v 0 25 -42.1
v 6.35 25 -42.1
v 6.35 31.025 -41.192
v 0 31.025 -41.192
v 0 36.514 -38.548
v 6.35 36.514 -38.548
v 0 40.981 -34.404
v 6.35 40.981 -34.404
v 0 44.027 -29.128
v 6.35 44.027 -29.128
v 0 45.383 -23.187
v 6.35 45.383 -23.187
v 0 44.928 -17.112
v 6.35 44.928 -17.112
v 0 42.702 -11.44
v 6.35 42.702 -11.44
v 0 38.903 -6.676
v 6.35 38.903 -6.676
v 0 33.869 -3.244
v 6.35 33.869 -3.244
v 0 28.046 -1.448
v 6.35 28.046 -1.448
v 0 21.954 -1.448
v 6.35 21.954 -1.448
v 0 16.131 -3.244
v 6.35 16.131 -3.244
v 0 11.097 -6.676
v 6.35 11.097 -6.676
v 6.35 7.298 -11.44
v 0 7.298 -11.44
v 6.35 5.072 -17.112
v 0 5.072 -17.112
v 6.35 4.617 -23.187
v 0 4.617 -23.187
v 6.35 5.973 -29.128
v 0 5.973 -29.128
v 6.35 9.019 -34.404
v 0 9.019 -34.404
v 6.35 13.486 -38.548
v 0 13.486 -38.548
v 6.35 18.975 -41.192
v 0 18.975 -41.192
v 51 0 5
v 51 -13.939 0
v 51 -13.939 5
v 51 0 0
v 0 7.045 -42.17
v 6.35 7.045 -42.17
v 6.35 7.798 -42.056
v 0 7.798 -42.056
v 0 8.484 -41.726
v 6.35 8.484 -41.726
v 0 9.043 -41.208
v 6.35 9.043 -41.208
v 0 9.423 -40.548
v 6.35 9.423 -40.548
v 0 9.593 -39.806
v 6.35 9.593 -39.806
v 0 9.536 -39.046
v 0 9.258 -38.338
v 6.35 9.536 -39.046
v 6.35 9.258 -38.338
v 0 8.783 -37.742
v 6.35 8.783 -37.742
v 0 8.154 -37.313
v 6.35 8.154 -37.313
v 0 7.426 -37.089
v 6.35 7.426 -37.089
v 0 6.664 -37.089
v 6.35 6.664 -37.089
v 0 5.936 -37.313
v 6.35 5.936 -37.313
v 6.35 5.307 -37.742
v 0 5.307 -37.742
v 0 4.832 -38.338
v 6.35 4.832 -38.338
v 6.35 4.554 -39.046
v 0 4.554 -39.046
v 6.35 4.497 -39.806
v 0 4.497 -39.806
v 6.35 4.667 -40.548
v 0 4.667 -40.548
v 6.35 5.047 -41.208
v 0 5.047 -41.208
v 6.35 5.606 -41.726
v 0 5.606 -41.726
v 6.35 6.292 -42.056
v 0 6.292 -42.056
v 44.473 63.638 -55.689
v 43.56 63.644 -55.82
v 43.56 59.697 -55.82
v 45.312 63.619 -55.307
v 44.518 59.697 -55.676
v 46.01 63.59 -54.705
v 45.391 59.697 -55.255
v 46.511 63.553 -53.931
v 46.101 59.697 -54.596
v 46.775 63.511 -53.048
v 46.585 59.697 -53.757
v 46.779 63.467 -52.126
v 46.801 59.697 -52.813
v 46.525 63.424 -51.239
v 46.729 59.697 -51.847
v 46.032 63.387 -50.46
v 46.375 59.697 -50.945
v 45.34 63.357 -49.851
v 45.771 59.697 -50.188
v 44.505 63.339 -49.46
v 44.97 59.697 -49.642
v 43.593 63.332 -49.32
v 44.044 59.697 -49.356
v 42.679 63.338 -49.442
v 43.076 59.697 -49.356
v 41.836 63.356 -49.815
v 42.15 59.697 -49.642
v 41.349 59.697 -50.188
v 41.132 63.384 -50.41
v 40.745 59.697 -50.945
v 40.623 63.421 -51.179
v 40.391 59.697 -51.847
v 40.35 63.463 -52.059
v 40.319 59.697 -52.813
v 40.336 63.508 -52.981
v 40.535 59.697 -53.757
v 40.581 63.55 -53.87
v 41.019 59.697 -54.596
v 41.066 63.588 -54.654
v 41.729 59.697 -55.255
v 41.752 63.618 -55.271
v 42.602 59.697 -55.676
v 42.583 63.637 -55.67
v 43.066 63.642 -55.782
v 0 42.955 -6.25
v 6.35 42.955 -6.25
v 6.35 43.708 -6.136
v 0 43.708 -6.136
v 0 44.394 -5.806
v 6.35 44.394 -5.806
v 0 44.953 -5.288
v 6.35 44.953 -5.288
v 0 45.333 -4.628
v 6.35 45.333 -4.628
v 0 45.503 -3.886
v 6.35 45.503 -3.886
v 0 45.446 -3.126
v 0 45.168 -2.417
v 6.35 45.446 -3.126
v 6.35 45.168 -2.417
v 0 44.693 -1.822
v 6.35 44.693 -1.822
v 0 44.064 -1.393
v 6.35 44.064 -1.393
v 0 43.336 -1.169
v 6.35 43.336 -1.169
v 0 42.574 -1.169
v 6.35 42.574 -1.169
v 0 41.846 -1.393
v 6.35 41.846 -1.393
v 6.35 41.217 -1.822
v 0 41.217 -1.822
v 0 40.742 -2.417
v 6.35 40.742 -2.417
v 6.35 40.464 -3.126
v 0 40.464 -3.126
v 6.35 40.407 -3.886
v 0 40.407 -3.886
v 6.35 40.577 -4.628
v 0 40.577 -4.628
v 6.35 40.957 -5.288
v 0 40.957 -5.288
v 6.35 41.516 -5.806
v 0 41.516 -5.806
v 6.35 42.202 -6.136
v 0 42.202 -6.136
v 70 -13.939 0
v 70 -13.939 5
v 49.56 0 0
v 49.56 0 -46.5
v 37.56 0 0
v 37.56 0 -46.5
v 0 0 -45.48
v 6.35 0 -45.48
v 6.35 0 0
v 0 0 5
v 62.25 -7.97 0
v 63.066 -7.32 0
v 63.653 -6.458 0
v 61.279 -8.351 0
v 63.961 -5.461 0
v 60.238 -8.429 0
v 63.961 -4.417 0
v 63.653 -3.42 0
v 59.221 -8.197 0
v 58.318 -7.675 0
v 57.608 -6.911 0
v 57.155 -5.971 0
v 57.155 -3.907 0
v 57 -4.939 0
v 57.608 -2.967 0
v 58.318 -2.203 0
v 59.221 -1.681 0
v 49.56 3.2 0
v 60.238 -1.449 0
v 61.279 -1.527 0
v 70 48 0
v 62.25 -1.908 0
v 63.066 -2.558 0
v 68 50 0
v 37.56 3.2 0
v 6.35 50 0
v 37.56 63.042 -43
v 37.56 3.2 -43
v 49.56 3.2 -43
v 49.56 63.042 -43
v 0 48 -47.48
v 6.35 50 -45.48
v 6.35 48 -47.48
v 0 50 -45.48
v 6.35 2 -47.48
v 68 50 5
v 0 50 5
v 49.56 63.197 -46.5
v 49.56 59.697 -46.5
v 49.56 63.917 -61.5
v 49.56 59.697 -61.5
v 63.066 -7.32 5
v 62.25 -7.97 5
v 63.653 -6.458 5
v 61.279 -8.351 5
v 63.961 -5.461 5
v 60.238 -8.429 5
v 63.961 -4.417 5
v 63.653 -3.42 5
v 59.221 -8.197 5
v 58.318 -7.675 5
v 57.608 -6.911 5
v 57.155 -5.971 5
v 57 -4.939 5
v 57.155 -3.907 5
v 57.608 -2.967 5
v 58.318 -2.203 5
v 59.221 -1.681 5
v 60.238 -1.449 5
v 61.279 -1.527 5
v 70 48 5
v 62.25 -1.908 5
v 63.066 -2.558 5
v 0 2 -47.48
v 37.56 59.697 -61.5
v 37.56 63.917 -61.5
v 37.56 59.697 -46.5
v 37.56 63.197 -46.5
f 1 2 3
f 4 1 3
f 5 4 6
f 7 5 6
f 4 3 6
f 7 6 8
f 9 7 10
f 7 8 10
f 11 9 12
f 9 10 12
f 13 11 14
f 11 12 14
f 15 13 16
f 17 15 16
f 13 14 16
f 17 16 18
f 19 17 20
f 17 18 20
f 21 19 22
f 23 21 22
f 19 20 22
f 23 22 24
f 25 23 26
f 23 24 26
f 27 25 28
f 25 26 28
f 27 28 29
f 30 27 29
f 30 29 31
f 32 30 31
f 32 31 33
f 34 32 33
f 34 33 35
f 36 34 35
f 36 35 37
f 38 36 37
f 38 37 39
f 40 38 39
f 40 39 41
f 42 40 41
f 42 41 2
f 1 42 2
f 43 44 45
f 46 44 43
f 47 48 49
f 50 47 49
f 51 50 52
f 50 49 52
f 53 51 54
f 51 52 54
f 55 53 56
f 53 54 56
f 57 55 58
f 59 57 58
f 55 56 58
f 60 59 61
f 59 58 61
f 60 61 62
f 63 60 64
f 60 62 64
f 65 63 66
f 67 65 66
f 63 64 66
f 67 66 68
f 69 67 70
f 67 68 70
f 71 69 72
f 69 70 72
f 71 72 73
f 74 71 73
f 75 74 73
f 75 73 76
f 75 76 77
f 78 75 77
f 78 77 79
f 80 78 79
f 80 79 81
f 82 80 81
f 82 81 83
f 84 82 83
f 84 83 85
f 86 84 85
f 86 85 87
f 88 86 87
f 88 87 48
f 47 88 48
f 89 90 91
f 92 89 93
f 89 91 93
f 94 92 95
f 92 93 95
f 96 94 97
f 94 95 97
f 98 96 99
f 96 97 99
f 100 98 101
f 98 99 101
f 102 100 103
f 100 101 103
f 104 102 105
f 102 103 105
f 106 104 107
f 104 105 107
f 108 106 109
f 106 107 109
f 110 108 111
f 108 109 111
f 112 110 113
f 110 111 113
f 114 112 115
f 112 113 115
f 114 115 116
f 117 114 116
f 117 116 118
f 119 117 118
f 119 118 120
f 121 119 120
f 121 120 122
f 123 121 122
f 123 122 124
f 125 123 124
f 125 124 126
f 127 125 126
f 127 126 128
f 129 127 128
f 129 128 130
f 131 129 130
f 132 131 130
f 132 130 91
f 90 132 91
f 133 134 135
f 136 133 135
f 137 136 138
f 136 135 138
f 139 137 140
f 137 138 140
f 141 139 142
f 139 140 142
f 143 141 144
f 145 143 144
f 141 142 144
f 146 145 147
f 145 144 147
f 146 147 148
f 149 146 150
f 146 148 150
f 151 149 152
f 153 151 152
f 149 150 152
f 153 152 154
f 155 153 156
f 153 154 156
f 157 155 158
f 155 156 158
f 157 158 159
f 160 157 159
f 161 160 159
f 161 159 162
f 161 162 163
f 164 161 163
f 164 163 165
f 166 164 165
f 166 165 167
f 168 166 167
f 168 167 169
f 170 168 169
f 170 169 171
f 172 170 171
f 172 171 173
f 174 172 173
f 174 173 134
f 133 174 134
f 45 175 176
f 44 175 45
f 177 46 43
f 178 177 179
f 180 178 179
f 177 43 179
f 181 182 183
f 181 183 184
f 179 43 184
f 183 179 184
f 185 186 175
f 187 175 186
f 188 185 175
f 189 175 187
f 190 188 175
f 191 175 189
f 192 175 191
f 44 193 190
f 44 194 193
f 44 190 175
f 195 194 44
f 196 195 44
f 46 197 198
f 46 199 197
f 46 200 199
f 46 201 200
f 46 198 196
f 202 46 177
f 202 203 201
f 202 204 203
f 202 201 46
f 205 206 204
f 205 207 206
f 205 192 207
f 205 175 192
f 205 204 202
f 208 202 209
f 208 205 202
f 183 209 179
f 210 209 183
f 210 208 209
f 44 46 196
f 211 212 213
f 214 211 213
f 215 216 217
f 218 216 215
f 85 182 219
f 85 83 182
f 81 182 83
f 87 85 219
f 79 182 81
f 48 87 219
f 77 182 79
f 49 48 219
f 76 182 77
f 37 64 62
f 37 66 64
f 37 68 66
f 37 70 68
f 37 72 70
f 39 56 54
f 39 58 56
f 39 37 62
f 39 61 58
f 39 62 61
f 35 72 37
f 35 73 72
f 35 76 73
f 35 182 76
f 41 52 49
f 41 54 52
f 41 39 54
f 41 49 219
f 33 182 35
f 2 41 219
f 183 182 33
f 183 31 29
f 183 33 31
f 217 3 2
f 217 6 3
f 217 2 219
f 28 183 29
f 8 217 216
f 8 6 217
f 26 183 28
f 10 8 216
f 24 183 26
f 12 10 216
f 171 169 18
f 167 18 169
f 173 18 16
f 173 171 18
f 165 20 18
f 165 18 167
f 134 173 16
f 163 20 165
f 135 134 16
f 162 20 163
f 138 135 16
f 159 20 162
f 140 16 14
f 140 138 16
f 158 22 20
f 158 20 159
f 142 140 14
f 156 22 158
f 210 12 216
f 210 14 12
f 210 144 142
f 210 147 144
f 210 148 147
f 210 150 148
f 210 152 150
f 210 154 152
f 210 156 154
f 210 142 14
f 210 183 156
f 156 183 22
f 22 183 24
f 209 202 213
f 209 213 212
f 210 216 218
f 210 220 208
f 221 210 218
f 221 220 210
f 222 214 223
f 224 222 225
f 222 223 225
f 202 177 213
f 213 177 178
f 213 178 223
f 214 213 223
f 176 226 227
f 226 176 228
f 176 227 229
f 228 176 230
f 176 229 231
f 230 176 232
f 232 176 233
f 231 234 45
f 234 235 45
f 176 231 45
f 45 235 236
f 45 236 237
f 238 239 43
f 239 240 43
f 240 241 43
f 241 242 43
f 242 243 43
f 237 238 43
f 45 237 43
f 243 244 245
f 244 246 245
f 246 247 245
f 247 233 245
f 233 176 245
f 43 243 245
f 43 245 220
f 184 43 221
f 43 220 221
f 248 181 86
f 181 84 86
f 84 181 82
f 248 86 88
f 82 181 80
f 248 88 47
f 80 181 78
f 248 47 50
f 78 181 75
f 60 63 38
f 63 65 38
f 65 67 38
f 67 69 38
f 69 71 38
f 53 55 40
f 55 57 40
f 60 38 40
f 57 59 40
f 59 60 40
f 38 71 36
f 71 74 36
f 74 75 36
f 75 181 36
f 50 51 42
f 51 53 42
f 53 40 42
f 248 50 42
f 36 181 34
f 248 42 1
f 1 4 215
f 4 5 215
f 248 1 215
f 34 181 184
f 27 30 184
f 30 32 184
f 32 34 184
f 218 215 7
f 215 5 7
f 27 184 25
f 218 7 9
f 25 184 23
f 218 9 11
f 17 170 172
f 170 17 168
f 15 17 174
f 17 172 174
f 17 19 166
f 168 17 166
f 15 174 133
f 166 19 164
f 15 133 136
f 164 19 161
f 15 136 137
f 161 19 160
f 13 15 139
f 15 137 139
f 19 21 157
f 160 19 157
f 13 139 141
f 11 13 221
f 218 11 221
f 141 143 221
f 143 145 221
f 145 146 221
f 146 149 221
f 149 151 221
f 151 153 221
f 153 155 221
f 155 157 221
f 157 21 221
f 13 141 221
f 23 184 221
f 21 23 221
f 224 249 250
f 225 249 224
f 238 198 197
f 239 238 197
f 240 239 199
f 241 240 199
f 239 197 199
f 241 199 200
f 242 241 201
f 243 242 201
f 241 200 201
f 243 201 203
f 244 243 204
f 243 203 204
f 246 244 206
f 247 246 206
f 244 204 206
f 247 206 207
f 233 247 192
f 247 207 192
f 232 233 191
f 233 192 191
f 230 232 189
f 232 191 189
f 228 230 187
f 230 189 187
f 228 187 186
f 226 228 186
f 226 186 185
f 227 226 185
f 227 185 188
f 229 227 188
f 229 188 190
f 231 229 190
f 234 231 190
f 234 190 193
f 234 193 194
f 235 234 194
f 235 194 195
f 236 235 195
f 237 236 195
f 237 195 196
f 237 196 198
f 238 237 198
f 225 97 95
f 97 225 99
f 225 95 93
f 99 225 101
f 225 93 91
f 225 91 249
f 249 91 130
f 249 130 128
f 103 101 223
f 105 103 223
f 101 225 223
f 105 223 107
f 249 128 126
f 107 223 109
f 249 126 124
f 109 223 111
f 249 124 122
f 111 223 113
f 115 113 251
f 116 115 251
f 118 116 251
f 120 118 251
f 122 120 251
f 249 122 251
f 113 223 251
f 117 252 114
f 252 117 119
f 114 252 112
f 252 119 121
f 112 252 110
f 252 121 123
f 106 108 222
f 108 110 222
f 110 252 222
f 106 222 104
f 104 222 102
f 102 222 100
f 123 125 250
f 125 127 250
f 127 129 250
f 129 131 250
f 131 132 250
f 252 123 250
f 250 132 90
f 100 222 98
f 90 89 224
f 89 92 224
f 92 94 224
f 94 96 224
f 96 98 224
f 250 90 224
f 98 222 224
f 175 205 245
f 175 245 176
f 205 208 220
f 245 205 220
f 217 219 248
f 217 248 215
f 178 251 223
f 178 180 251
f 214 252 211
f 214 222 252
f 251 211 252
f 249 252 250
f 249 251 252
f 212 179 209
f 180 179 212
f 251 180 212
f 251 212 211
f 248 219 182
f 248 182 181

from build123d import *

# Parameters (mm, degrees)
BOSS_EXTRUDE1_DEPTH  = 5
SKETCH2_W            = 6.35
SKETCH2_H            = 50
BOSS_EXTRUDE2_DEPTH  = 52.48
CUT_EXTRUDE1_REACH   = 106.448
SKETCH3_R            = 20.44
SKETCH3_R_2          = 2.555
SKETCH3_W            = 5
SKETCH3_H            = 50
CUT_EXTRUDE2_REACH   = 108.104
SKETCH4_R            = 3.5
CUT_EXTRUDE6_REACH   = 108.104
SKETCH14_W           = 23.196263878
SKETCH14_H           = 15.316152196
SKETCH15_W           = 12
SKETCH15_H           = 3.2
BOSS_EXTRUDE7_DEPTH  = 46.5
BOSS_EXTRUDE8_REACH  = 98.667
SKETCH16_W           = 12
SKETCH16_H           = 3.5
SKETCH17_W           = 12
SKETCH17_H           = 3.5
BOSS_EXTRUDE9_DEPTH  = 15
CHAMFER2_SIZE        = 2
SKETCH22_W           = 12
SKETCH22_H           = 15
BOSS_EXTRUDE10_DEPTH = 0.72
CUT_EXTRUDE8_REACH   = 103.606
CUT_EXTRUDE7_REACH   = 120.762
SKETCH18_R           = 3.25


with BuildPart() as part:
    # Sketch1 → Boss-Extrude1 (new body)
    with BuildSketch(Plane.XY):
        Polygon((0, 0), (0, 50), (51, 50), (51, 64.061014889), (70, 64.061014889), (70, -13.938985111), (51, -13.938985111), (51, 0), align=None)
    extrude(amount=BOSS_EXTRUDE1_DEPTH)

    # Sketch2 → Boss-Extrude2 (add)
    with BuildSketch(Plane(origin=(0, 0, 0), x_dir=(-1, 0, 0), z_dir=(0, 0, -1))):
        with Locations((-3.175, 25)):
            Rectangle(SKETCH2_W, SKETCH2_H)
    extrude(amount=BOSS_EXTRUDE2_DEPTH)

    # Sketch3 → Cut-Extrude1 (cut, up to next)
    with BuildSketch(Plane(origin=(6.35, 0, 0), x_dir=(0, 0, -1), z_dir=(1, 0, 0)), mode=Mode.PRIVATE) as cut_extrude1_sk1:
        with Locations((21.66, 25)):
            Circle(SKETCH3_R)
    cut_extrude1_tool1 = extrude(cut_extrude1_sk1.sketch, amount=-CUT_EXTRUDE1_REACH, mode=Mode.PRIVATE) & part.part
    # Sketch3 → Cut-Extrude1 (cut, up to next)
    with BuildSketch(Plane(origin=(6.35, 0, 0), x_dir=(0, 0, -1), z_dir=(1, 0, 0)), mode=Mode.PRIVATE) as cut_extrude1_sk2:
        with Locations((3.695, 42.955)):
            Circle(SKETCH3_R_2)
    cut_extrude1_tool2 = extrude(cut_extrude1_sk2.sketch, amount=-CUT_EXTRUDE1_REACH, mode=Mode.PRIVATE) & part.part
    # Sketch3 → Cut-Extrude1 (cut, up to next)
    with BuildSketch(Plane(origin=(6.35, 0, 0), x_dir=(0, 0, -1), z_dir=(1, 0, 0)), mode=Mode.PRIVATE) as cut_extrude1_sk3:
        with Locations((39.615, 7.045)):
            Circle(SKETCH3_R_2)
    cut_extrude1_tool3 = extrude(cut_extrude1_sk3.sketch, amount=-CUT_EXTRUDE1_REACH, mode=Mode.PRIVATE) & part.part
    # Sketch3 → Cut-Extrude1 (cut, up to next)
    with BuildSketch(Plane(origin=(6.35, 0, 0), x_dir=(0, 0, -1), z_dir=(1, 0, 0)), mode=Mode.PRIVATE) as cut_extrude1_sk4:
        with Locations((49.98, 25)):
            Rectangle(SKETCH3_W, SKETCH3_H)
    cut_extrude1_tool4 = extrude(cut_extrude1_sk4.sketch, amount=-CUT_EXTRUDE1_REACH, mode=Mode.PRIVATE) & part.part
    add(cut_extrude1_tool1.solids().sort_by_distance((6.35, 25, -21.66))[0], mode=Mode.SUBTRACT)
    add(cut_extrude1_tool2.solids().sort_by_distance((6.35, 42.955, -3.695))[0], mode=Mode.SUBTRACT)
    add(cut_extrude1_tool3.solids().sort_by_distance((6.35, 7.045, -39.615))[0], mode=Mode.SUBTRACT)
    add(cut_extrude1_tool4.solids().sort_by_distance((6.35, 25, -49.98))[0], mode=Mode.SUBTRACT)

    # Sketch4 → Cut-Extrude2 (cut, up to next)
    with BuildSketch(Plane(origin=(0, 0, 0), x_dir=(-1, 0, 0), z_dir=(0, 0, -1)), mode=Mode.PRIVATE) as cut_extrude2_sk1:
        with Locations((-60.5, 55.061014889)):
            Circle(SKETCH4_R)
    cut_extrude2_tool1 = extrude(cut_extrude2_sk1.sketch, amount=-CUT_EXTRUDE2_REACH, mode=Mode.PRIVATE) & part.part
    # Sketch4 → Cut-Extrude2 (cut, up to next)
    with BuildSketch(Plane(origin=(0, 0, 0), x_dir=(-1, 0, 0), z_dir=(0, 0, -1)), mode=Mode.PRIVATE) as cut_extrude2_sk2:
        with Locations((-60.5, -4.938985111)):
            Circle(SKETCH4_R)
    cut_extrude2_tool2 = extrude(cut_extrude2_sk2.sketch, amount=-CUT_EXTRUDE2_REACH, mode=Mode.PRIVATE) & part.part
    add(cut_extrude2_tool1.solids().sort_by_distance((60.5, 55.061015, 0))[0], mode=Mode.SUBTRACT)
    add(cut_extrude2_tool2.solids().sort_by_distance((60.5, -4.938985, 0))[0], mode=Mode.SUBTRACT)

    # Sketch14 → Cut-Extrude6 (cut, up to next)
    with BuildSketch(Plane(origin=(0, 0, 0), x_dir=(-1, 0, 0), z_dir=(0, 0, -1)), mode=Mode.PRIVATE) as cut_extrude6_sk1:
        with Locations((-62.598131939, 57.658076098)):
            Rectangle(SKETCH14_W, SKETCH14_H)
    cut_extrude6_tool1 = extrude(cut_extrude6_sk1.sketch, amount=-CUT_EXTRUDE6_REACH, mode=Mode.PRIVATE) & part.part
    add(cut_extrude6_tool1.solids().sort_by_distance((62.598132, 57.658076, 0))[0], mode=Mode.SUBTRACT)

    # Sketch15 → Boss-Extrude7 (add)
    with BuildSketch(Plane(origin=(0, 0, 0), x_dir=(-1, 0, 0), z_dir=(0, 0, -1))):
        with Locations((-43.56, 1.6)):
            Rectangle(SKETCH15_W, SKETCH15_H)
    extrude(amount=BOSS_EXTRUDE7_DEPTH)

    # Boss-Extrude8: up to this plane
    boss_extrude8_end = Plane(origin=(166.832994776, 64.085435133, -66.619565524), z_dir=(-1.1416993347548052e-15, 0.9990256874715413, 0.04413247978546202))
    # Sketch16 → Boss-Extrude8 (add, up to the surface)
    with BuildSketch(Plane(origin=(0, 3.2, 0), x_dir=(1, 0, 0), z_dir=(0, 1, 0)), mode=Mode.PRIVATE) as boss_extrude8_sk1:
        with Locations((43.56, 44.75)):
            Rectangle(SKETCH16_W, SKETCH16_H)
    boss_extrude8_tool1 = split(extrude(boss_extrude8_sk1.sketch, amount=BOSS_EXTRUDE8_REACH, mode=Mode.PRIVATE), bisect_by=boss_extrude8_end, keep=Keep.BOTH, mode=Mode.PRIVATE)
    add(boss_extrude8_tool1.solids().sort_by_distance((43.56, 3.2, -44.75))[0])

    # Sketch17 → Boss-Extrude9 (add)
    with BuildSketch(Plane(origin=(0, 0, -46.5), x_dir=(-1, 0, 0), z_dir=(0, 0, -1))):
        with Locations((-43.56, 61.446642853)):
            Rectangle(SKETCH17_W, SKETCH17_H)
    extrude(amount=BOSS_EXTRUDE9_DEPTH)

    # Chamfer2
    chamfer2_edges = [part.edges().sort_by_distance(p)[0] for p in [
        (3.175, 0, -47.48),
        (3.175, 50, -47.48),
        (70, 50, 2.5),
    ]]
    chamfer(chamfer2_edges, length=CHAMFER2_SIZE)

    # Sketch22 → Boss-Extrude10 (add)
    with BuildSketch(Plane(origin=(0, 63.196642853, 0), x_dir=(1, 0, 0), z_dir=(0, 1, 0))):
        with Locations((43.56, 54)):
            Rectangle(SKETCH22_W, SKETCH22_H)
    extrude(amount=BOSS_EXTRUDE10_DEPTH)

    # Sketch23 → Cut-Extrude8 (cut, up to next)
    with BuildSketch(Plane(origin=(49.56, 0, 0), x_dir=(0, 0, -1), z_dir=(1, 0, 0)), mode=Mode.PRIVATE) as cut_extrude8_sk1:
        Polygon((46.5, 63.916642853), (46.5, 63.196642853), (61.5, 63.916642853), align=None)
    cut_extrude8_tool1 = extrude(cut_extrude8_sk1.sketch, amount=-CUT_EXTRUDE8_REACH, mode=Mode.PRIVATE) & part.part
    add(cut_extrude8_tool1.solids().sort_by_distance((49.56, 63.676643, -51.5))[0], mode=Mode.SUBTRACT)

    # Cut-Extrude7: up to this plane
    cut_extrude7_end = Plane(origin=(-0.001, 63.196642853, -46.5), z_dir=(-2.1659106514416256e-15, -0.9988499868416298, -0.04794479936839813))
    # Sketch18 → Cut-Extrude7 (cut, up to the surface)
    with BuildSketch(Plane.XZ.offset(-59.696642853), mode=Mode.PRIVATE) as cut_extrude7_sk1:
        with Locations(Location((43.56, -52.57, 0), (0, 0, 270))):
            Circle(SKETCH18_R)
    cut_extrude7_tool1 = split(extrude(cut_extrude7_sk1.sketch, amount=-CUT_EXTRUDE7_REACH, mode=Mode.PRIVATE), bisect_by=cut_extrude7_end, keep=Keep.BOTH, mode=Mode.PRIVATE)
    add(cut_extrude7_tool1.solids().sort_by_distance((43.56, 59.696643, -52.57))[0], mode=Mode.SUBTRACT)


solid = part.part
